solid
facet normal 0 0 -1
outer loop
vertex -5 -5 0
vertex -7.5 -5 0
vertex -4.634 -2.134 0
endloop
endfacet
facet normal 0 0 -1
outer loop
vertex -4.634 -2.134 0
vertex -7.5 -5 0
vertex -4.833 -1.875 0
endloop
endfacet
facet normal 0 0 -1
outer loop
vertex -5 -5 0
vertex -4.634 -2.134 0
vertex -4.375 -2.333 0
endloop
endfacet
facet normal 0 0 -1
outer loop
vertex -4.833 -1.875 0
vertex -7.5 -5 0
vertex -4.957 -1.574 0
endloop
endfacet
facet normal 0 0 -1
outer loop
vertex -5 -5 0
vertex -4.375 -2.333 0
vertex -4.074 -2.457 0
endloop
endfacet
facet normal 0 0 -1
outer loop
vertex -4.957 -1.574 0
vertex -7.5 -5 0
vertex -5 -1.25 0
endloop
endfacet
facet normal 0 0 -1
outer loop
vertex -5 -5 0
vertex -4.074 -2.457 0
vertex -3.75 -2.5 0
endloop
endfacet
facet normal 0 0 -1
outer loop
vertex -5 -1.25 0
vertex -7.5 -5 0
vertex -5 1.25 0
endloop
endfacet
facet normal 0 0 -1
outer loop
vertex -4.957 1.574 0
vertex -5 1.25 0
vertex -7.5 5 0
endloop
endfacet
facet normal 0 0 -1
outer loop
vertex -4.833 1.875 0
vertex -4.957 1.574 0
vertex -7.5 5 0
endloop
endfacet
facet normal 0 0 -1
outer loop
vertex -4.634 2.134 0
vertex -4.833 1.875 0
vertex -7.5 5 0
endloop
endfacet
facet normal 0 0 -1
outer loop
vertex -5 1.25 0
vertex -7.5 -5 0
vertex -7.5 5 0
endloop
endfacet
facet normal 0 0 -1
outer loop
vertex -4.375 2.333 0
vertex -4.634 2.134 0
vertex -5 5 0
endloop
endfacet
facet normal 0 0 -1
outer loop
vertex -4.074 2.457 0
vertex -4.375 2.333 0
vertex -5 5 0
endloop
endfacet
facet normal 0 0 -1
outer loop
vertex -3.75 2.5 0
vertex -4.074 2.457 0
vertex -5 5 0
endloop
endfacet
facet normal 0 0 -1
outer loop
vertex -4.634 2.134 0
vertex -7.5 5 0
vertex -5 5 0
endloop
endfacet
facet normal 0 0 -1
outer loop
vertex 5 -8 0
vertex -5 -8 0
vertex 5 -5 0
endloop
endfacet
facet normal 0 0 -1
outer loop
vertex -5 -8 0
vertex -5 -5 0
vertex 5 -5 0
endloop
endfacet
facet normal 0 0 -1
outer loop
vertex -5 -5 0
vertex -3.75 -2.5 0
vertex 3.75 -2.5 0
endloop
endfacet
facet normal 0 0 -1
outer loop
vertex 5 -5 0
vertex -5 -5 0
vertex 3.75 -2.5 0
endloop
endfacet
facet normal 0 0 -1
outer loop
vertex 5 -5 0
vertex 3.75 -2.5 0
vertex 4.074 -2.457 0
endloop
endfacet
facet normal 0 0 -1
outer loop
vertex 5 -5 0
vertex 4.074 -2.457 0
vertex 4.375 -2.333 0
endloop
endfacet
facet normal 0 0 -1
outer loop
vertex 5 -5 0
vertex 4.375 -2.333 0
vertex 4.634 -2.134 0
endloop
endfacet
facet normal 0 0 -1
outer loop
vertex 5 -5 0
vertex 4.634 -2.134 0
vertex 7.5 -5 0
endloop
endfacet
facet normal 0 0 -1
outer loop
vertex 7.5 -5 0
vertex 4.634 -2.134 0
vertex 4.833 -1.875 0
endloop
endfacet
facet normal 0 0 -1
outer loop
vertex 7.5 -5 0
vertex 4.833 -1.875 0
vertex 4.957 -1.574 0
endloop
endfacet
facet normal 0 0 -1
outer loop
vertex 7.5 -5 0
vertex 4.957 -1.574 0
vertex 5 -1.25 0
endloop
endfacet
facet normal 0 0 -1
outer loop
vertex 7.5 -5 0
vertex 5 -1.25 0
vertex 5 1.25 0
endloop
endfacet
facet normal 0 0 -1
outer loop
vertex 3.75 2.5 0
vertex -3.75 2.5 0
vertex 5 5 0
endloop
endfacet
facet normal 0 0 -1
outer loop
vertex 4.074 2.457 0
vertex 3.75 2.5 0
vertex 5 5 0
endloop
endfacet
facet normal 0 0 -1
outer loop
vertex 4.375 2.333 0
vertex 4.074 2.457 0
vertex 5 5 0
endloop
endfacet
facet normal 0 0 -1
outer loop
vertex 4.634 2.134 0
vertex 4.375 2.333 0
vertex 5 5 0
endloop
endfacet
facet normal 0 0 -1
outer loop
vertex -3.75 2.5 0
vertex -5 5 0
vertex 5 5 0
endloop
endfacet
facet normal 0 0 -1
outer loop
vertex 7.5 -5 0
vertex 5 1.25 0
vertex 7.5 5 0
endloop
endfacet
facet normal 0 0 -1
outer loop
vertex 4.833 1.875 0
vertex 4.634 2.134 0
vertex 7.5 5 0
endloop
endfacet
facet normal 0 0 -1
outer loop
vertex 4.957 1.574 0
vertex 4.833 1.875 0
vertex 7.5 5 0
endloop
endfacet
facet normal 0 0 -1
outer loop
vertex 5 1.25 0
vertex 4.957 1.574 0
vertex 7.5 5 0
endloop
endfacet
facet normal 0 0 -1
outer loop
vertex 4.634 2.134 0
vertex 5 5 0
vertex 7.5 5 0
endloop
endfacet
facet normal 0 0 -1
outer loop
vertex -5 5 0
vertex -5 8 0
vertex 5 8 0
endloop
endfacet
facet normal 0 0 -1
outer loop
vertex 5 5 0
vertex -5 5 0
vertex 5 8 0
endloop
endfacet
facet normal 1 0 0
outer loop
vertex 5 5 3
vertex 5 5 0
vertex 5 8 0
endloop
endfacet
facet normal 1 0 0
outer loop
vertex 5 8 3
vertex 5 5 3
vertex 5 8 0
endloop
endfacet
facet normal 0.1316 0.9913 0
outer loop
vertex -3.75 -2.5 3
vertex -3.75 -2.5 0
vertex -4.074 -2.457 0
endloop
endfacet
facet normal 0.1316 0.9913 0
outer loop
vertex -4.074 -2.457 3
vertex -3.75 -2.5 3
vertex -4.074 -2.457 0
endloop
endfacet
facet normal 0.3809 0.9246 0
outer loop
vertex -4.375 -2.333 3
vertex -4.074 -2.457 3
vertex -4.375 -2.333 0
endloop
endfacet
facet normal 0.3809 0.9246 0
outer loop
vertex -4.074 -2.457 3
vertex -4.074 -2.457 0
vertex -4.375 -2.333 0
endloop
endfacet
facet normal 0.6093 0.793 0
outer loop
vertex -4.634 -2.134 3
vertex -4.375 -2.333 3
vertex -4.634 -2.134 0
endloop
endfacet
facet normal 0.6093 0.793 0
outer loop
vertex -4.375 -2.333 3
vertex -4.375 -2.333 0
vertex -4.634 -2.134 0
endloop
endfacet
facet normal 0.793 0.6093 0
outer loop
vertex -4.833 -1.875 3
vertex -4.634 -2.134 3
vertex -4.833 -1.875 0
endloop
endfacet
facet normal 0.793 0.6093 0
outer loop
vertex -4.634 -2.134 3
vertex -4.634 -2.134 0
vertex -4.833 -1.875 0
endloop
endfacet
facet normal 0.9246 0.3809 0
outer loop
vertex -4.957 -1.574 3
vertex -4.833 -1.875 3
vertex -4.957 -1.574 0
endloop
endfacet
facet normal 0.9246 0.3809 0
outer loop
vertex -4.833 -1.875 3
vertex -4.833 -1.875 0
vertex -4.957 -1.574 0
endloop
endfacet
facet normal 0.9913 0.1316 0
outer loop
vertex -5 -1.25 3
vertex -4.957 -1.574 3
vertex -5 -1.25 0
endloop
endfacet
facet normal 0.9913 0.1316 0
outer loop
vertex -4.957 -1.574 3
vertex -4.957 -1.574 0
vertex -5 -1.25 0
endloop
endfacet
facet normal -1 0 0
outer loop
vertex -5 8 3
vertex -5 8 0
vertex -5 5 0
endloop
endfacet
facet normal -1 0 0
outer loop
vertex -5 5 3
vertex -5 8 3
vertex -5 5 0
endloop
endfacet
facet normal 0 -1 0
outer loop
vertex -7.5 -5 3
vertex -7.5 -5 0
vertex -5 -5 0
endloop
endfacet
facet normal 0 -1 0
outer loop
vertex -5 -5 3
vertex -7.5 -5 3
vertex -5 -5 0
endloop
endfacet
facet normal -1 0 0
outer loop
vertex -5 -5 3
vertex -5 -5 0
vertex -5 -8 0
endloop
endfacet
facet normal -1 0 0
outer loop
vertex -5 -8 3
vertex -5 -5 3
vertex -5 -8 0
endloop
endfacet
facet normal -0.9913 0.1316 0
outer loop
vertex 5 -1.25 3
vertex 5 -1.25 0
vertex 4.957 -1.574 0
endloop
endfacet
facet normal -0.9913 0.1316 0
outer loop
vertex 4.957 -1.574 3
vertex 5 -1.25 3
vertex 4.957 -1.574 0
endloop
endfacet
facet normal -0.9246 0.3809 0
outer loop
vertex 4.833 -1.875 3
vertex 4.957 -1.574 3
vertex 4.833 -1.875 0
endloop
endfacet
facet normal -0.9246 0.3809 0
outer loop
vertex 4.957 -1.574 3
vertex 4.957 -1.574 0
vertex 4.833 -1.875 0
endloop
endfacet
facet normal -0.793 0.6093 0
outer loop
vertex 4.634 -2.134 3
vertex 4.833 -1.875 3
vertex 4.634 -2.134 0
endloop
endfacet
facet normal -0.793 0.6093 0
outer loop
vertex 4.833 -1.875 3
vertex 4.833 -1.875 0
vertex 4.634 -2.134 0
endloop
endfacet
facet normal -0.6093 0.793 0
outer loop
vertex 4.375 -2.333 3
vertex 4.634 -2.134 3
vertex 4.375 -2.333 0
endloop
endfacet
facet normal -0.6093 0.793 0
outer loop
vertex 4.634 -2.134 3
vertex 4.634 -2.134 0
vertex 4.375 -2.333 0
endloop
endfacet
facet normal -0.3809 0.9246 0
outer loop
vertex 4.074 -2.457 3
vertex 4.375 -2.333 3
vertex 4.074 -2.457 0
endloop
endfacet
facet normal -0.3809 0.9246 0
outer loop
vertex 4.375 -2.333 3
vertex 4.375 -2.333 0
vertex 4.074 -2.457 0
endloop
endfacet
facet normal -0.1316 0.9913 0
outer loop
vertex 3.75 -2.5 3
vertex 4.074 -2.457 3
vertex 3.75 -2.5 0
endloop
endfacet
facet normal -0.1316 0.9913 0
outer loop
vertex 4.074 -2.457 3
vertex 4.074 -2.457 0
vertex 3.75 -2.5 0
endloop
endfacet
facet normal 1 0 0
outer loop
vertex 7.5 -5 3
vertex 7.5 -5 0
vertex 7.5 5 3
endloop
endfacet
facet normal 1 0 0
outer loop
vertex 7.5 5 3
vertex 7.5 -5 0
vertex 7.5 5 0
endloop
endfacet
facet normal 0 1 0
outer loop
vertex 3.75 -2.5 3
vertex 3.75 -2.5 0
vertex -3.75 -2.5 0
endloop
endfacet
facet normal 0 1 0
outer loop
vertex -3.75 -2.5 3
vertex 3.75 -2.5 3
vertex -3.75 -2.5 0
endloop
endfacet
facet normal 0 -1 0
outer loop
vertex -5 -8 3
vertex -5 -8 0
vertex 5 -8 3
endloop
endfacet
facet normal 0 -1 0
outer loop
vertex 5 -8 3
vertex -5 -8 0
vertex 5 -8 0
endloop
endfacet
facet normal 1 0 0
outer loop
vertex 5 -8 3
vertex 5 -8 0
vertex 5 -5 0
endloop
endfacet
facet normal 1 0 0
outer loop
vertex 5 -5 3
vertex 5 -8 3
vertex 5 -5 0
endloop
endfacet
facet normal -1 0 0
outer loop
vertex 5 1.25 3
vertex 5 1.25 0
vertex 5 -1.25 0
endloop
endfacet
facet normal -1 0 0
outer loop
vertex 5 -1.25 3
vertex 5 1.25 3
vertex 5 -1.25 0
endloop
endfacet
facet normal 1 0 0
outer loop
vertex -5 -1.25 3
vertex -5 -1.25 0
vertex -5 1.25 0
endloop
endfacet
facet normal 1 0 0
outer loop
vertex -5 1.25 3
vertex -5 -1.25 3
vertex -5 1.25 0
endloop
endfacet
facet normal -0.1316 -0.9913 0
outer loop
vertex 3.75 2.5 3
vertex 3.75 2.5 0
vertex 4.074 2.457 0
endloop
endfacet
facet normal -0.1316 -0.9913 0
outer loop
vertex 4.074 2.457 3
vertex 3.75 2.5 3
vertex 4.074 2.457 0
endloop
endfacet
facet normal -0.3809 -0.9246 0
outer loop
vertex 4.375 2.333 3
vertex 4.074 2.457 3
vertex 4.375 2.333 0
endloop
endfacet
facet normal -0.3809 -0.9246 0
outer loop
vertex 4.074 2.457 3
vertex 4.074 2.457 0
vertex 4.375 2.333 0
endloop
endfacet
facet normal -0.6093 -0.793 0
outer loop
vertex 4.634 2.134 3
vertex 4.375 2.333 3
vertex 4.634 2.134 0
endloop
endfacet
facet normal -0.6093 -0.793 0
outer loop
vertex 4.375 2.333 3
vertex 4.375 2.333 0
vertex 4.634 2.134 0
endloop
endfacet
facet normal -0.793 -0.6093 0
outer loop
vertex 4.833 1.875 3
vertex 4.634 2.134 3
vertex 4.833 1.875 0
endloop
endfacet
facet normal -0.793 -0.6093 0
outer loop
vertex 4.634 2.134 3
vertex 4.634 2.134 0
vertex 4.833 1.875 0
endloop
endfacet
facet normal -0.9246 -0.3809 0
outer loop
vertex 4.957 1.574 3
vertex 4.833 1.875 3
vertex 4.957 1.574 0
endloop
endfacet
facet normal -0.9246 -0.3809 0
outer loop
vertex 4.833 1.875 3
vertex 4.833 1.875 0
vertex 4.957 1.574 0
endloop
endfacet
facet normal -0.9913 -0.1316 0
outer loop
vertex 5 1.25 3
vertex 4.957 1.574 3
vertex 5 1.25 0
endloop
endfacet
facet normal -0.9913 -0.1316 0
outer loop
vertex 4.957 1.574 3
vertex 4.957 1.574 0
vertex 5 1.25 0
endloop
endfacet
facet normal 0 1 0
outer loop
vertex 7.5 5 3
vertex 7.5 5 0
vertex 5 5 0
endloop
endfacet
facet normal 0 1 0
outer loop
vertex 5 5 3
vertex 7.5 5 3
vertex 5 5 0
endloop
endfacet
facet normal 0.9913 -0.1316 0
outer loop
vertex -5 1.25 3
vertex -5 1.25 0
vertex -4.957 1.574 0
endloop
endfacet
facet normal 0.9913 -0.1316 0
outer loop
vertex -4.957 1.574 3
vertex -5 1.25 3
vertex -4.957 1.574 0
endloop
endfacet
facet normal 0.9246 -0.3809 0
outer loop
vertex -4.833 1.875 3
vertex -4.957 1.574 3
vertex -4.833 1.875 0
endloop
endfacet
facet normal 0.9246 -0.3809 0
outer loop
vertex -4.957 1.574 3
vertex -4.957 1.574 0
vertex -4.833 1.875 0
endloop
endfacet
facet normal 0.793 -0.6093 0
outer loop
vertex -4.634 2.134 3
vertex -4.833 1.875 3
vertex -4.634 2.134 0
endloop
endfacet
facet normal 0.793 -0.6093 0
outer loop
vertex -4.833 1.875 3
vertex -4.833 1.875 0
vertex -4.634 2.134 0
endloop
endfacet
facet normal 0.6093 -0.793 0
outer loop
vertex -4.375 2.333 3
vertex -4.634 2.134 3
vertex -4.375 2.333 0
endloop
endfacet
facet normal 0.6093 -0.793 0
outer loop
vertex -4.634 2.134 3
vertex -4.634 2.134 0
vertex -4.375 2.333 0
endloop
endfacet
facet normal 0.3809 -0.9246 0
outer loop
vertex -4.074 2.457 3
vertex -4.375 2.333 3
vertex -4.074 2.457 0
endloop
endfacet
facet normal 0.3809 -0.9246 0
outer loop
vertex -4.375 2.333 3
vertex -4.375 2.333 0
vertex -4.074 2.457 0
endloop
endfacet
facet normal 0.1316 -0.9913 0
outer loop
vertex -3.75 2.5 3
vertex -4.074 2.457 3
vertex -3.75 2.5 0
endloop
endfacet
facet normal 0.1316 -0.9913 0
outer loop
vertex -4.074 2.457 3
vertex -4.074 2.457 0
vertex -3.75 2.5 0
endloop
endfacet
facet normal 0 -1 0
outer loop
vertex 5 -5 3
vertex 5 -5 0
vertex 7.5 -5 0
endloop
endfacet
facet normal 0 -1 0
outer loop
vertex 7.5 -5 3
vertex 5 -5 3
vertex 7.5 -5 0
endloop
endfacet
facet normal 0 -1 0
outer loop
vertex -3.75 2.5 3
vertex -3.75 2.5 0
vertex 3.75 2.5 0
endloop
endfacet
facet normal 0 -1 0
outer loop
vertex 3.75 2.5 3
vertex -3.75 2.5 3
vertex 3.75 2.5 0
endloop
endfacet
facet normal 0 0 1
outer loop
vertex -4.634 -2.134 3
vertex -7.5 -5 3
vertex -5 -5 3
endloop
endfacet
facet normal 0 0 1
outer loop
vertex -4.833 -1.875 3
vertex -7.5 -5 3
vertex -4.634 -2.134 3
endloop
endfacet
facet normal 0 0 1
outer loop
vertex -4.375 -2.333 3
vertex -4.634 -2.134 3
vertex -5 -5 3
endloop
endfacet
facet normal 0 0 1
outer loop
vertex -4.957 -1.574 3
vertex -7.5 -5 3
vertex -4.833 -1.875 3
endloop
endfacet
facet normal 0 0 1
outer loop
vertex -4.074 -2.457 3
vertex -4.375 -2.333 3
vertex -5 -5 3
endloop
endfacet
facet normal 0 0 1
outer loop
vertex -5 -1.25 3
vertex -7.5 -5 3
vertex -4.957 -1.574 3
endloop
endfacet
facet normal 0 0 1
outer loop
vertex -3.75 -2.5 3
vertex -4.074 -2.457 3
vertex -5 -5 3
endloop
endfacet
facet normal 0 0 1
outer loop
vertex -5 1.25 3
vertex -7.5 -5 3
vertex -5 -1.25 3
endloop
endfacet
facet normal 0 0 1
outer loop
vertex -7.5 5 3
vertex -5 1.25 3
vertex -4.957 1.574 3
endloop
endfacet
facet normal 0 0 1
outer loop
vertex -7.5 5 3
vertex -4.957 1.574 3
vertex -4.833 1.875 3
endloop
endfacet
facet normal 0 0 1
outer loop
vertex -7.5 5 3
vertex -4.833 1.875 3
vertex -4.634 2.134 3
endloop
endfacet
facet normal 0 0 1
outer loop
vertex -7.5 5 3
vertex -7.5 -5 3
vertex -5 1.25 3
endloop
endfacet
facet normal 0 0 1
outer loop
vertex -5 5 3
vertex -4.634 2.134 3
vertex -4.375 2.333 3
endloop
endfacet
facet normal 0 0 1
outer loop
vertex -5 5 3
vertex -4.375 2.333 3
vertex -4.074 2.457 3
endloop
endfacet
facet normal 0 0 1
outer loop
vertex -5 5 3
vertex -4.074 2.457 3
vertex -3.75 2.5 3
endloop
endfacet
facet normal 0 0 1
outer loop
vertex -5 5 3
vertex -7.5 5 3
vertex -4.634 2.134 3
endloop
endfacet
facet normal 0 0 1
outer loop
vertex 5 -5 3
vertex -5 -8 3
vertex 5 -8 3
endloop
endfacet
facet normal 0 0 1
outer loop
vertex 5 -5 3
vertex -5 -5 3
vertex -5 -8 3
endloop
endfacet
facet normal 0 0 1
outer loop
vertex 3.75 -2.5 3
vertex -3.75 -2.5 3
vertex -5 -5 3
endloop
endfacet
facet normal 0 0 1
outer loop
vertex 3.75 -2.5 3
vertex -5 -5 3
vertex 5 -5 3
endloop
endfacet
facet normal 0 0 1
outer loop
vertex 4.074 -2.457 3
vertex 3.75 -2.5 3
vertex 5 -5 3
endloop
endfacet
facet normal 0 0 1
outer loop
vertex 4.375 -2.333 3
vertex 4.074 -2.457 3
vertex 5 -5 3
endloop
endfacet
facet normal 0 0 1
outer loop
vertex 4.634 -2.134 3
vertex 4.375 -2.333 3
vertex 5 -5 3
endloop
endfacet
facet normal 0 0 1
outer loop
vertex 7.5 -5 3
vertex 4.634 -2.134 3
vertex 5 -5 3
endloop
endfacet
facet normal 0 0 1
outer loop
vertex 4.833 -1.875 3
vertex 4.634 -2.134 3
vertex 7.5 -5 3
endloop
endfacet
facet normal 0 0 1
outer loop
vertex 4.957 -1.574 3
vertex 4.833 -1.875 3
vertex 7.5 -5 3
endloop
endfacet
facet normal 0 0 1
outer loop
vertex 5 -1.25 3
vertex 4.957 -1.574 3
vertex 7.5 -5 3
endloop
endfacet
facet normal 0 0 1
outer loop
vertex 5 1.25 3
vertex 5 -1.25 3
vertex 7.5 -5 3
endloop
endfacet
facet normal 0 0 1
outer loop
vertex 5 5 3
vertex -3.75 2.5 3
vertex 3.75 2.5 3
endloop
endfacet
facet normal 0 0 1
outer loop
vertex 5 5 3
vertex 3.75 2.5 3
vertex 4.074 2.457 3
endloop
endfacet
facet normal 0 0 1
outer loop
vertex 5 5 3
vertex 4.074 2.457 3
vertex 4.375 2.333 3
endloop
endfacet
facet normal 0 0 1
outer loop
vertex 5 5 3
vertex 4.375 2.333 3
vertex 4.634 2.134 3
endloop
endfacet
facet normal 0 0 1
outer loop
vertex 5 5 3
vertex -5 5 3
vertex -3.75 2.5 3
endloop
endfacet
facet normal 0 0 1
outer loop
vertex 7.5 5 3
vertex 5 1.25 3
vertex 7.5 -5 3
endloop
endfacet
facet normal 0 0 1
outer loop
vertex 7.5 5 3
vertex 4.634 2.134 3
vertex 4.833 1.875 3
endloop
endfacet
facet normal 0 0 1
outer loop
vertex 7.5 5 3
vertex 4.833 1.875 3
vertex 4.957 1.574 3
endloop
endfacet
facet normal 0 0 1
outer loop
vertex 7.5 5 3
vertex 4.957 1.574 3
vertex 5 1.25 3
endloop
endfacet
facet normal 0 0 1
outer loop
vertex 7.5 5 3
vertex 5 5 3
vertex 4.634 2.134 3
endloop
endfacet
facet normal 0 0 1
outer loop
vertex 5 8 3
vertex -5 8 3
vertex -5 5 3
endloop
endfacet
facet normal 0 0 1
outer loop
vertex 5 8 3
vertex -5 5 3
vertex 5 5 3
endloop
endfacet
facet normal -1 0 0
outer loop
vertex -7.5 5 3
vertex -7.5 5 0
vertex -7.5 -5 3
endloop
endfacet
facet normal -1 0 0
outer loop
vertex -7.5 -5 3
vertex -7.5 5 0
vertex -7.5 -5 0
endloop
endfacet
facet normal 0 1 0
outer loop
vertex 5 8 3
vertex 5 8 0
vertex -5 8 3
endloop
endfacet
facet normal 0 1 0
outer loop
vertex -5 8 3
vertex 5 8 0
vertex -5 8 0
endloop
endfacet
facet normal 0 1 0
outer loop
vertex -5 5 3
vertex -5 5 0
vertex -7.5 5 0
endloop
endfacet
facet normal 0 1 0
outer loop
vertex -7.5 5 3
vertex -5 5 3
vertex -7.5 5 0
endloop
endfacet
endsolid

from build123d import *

# Parameters (mm, degrees)
SALIENTE_EXTRUIR1_DEPTH = 3


with BuildPart() as part:
    # Croquis1 → Saliente-Extruir1 (new body)
    with BuildSketch(Plane.XY):
        Polygon((-5, -8), (5, -8), (5, -5), (7.5, -5), (7.5, 5), (5, 5), (5, 8), (-5, 8), (-5, 5), (-7.5, 5), (-7.5, -5), (-5, -5), align=None)
        with BuildLine():
            ThreePointArc((5, -1.25), (4.633883476, -2.133883476), (3.75, -2.5))
            Line((3.75, -2.5), (-3.75, -2.5))
            ThreePointArc((-3.75, -2.5), (-4.633883476, -2.133883476), (-5, -1.25))
            Line((-5, -1.25), (-5, 1.25))
            ThreePointArc((-5, 1.25), (-4.633883476, 2.133883476), (-3.75, 2.5))
            Line((-3.75, 2.5), (3.75, 2.5))
            ThreePointArc((3.75, 2.5), (4.633883476, 2.133883476), (5, 1.25))
            Line((5, 1.25), (5, -1.25))
        make_face(mode=Mode.SUBTRACT)
    extrude(amount=SALIENTE_EXTRUIR1_DEPTH)


solid = part.part
